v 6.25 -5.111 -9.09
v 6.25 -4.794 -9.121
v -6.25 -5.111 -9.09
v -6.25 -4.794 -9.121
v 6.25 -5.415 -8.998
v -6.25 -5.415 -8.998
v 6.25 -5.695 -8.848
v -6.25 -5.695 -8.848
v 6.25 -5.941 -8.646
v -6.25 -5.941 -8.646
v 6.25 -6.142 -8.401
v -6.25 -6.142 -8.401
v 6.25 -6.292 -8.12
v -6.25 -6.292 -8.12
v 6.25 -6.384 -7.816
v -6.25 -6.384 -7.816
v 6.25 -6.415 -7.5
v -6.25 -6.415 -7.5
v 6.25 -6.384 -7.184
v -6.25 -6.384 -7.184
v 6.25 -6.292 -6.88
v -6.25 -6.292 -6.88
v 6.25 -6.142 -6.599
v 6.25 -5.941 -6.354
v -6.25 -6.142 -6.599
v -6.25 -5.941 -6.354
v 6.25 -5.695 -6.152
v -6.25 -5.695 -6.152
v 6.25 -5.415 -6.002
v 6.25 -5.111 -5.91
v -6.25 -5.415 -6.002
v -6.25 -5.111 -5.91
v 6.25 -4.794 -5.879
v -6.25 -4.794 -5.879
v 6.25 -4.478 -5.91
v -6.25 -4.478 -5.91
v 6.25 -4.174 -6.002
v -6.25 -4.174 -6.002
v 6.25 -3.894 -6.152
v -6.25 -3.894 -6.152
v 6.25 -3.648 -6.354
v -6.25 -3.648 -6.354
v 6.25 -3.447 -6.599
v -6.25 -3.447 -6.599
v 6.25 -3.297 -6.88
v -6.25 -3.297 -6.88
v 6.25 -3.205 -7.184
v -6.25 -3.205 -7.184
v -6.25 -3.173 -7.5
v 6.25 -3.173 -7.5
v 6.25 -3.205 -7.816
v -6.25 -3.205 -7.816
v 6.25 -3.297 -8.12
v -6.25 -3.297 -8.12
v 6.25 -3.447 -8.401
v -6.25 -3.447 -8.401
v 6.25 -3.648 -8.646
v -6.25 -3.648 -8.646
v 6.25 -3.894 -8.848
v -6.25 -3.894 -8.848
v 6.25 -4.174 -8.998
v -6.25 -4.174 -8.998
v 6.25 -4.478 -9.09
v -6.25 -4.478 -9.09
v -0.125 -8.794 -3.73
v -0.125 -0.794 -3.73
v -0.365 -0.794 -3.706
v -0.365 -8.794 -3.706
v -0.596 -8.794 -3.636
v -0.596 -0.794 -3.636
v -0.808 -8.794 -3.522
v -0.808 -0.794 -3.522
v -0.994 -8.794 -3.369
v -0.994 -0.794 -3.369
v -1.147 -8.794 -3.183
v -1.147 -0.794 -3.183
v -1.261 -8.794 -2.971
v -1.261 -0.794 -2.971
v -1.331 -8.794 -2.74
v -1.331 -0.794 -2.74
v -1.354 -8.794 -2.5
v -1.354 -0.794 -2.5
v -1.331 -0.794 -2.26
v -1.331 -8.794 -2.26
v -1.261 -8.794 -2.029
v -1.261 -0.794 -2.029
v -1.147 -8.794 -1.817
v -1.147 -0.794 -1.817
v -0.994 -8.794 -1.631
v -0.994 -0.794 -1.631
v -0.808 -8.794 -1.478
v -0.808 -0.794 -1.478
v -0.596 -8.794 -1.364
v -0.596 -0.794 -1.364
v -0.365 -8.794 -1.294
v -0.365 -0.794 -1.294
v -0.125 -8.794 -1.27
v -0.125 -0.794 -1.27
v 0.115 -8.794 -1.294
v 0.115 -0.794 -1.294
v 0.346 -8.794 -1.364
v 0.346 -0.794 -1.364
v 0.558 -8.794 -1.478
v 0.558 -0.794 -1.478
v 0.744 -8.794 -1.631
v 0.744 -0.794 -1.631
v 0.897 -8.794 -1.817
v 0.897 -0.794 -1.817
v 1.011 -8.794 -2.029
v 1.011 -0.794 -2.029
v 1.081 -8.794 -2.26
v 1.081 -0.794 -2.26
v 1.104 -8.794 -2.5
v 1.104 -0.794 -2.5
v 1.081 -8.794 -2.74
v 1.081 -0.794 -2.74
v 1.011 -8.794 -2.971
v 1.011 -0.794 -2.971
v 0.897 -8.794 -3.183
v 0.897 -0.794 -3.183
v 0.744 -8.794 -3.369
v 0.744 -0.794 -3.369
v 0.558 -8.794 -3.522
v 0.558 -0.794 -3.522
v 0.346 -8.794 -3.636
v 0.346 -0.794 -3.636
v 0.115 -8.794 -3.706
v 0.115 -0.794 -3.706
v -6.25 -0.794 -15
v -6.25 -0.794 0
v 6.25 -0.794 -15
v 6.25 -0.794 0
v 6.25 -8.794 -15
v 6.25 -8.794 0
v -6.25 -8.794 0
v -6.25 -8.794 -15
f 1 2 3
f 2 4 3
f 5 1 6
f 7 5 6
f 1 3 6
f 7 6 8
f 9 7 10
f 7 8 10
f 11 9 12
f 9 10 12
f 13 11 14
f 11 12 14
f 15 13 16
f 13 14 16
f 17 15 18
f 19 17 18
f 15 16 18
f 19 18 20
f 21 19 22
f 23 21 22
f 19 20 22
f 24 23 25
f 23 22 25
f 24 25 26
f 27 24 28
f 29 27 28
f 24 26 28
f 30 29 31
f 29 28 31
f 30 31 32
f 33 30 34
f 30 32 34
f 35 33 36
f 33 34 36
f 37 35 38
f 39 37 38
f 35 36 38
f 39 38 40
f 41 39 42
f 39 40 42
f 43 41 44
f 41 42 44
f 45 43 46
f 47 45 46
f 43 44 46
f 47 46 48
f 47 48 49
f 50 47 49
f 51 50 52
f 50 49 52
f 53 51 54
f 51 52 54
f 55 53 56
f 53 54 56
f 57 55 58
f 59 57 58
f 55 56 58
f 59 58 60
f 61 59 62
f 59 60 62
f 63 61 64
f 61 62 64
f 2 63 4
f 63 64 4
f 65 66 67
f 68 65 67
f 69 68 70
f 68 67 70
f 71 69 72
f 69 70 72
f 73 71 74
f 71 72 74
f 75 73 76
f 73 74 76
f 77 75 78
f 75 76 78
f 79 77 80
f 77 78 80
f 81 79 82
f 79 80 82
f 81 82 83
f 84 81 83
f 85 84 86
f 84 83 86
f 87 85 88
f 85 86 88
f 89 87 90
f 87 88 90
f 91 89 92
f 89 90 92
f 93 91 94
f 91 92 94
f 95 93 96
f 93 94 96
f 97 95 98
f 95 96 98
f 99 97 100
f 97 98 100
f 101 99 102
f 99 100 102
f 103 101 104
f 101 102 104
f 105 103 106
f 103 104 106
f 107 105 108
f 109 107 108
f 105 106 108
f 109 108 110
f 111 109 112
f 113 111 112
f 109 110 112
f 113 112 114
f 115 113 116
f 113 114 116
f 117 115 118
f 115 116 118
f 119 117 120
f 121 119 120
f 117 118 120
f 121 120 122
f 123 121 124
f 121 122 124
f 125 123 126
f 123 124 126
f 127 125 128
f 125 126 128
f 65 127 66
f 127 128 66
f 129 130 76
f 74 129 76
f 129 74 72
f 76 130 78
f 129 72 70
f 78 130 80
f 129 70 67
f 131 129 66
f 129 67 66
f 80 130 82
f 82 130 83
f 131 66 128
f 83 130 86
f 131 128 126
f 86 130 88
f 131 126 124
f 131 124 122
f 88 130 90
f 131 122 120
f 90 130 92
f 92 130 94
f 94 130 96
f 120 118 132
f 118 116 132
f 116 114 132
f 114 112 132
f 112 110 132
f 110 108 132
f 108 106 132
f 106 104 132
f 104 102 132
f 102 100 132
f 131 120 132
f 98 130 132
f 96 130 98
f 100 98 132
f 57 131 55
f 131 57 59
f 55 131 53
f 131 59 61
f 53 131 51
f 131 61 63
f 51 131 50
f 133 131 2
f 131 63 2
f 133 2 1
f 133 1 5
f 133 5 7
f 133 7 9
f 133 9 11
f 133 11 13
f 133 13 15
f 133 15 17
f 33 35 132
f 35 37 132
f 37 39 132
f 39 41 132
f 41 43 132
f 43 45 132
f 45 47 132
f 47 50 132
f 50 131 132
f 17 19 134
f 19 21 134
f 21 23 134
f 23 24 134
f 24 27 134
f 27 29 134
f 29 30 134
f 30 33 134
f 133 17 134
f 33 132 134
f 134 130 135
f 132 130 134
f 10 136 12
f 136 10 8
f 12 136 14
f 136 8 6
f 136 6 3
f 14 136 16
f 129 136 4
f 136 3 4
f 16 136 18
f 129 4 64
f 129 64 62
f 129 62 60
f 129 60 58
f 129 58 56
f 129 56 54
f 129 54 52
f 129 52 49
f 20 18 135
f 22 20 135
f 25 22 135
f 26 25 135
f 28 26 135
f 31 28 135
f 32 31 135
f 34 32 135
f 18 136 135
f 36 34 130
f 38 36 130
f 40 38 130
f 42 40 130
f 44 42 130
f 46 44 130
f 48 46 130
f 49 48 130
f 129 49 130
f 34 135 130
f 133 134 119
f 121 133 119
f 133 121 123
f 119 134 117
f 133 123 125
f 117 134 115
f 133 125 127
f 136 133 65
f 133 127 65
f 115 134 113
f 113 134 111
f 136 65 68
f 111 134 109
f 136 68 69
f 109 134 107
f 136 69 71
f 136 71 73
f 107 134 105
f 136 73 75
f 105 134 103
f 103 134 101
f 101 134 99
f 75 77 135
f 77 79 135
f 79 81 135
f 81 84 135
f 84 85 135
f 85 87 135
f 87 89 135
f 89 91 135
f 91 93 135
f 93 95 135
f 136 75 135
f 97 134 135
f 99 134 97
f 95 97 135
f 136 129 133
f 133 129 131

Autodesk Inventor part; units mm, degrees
ref_plane "YZ Plane" through (0, 0, 0) normal (1, 0, 0) x (0, 1, 0)
ref_plane "XZ Plane" through (0, 0, 0) normal (0, 1, 0) x (-1, 0, 0)
ref_plane "XY Plane" through (0, 0, 0) normal (0, 0, 1) x (1, 0, 0)
sketch "Sketch1" plane through (0, 0, 0) normal (0, 0, 1) x (1, 0, 0)
  line L0 (3.9408, -0.7944) -> (3.5592, -0.7944)
  line L1 (1.4408, -0.7944) -> (1.0592, -0.7944)
  line L2 (-1.0592, -0.7944) -> (-1.4408, -0.7944)
  line L3 (-3.5592, -0.7944) -> (-3.9408, -0.7944)
  line L4 (-6.0592, -0.7944) -> (-6.25, -0.7944)
  line L5 (6.25, -0.7944) -> (6.0592, -0.7944)
  line L6 (6.25, -0.7944) -> (6.25, -8.7944)
  line L7 (6.25, -8.7944) -> (-6.25, -8.7944)
  line L8 (-6.25, -8.7944) -> (-6.25, -0.7944)
  line L9 (-6.25, -0.7944) -> (-6.0592, -0.7944)
  line L10 (-3.9408, -0.7944) -> (-3.5592, -0.7944)
  line L11 (-1.4408, -0.7944) -> (-1.0592, -0.7944)
  line L12 (1.0592, -0.7944) -> (1.4408, -0.7944)
  line L13 (3.5592, -0.7944) -> (3.9408, -0.7944)
  line L14 (6.0592, -0.7944) -> (6.25, -0.7944)
  line L15 (-6.25, -0.7944) -> (6.25, -0.7944)
  point P0 (0, 0)
  dimension "height" = 8
extrude "Extrusion1" add sketch "Sketch1" against normal blind 15
hole "Hole1" at (-0.125, -8.7944, -2.5) direction (0, 1, 0) diameter 2.459 end through all thread size "M3x0.5" class "6H" standard "ANSI Metric M Profile"
hole "Hole2" at (6.25, -4.7944, -7.5) direction (-1, 0, 0) diameter 3.242 end through all thread size "M4x0.7" class "6H" standard "ANSI Metric M Profile"
equation "\"d12\" = 0.5 * width"
equation "\"d13\" = 0.5 * height"
equation "\"width\" = 15"
properties part number "T2.5 belt holder" material "Aluminum 6061"
